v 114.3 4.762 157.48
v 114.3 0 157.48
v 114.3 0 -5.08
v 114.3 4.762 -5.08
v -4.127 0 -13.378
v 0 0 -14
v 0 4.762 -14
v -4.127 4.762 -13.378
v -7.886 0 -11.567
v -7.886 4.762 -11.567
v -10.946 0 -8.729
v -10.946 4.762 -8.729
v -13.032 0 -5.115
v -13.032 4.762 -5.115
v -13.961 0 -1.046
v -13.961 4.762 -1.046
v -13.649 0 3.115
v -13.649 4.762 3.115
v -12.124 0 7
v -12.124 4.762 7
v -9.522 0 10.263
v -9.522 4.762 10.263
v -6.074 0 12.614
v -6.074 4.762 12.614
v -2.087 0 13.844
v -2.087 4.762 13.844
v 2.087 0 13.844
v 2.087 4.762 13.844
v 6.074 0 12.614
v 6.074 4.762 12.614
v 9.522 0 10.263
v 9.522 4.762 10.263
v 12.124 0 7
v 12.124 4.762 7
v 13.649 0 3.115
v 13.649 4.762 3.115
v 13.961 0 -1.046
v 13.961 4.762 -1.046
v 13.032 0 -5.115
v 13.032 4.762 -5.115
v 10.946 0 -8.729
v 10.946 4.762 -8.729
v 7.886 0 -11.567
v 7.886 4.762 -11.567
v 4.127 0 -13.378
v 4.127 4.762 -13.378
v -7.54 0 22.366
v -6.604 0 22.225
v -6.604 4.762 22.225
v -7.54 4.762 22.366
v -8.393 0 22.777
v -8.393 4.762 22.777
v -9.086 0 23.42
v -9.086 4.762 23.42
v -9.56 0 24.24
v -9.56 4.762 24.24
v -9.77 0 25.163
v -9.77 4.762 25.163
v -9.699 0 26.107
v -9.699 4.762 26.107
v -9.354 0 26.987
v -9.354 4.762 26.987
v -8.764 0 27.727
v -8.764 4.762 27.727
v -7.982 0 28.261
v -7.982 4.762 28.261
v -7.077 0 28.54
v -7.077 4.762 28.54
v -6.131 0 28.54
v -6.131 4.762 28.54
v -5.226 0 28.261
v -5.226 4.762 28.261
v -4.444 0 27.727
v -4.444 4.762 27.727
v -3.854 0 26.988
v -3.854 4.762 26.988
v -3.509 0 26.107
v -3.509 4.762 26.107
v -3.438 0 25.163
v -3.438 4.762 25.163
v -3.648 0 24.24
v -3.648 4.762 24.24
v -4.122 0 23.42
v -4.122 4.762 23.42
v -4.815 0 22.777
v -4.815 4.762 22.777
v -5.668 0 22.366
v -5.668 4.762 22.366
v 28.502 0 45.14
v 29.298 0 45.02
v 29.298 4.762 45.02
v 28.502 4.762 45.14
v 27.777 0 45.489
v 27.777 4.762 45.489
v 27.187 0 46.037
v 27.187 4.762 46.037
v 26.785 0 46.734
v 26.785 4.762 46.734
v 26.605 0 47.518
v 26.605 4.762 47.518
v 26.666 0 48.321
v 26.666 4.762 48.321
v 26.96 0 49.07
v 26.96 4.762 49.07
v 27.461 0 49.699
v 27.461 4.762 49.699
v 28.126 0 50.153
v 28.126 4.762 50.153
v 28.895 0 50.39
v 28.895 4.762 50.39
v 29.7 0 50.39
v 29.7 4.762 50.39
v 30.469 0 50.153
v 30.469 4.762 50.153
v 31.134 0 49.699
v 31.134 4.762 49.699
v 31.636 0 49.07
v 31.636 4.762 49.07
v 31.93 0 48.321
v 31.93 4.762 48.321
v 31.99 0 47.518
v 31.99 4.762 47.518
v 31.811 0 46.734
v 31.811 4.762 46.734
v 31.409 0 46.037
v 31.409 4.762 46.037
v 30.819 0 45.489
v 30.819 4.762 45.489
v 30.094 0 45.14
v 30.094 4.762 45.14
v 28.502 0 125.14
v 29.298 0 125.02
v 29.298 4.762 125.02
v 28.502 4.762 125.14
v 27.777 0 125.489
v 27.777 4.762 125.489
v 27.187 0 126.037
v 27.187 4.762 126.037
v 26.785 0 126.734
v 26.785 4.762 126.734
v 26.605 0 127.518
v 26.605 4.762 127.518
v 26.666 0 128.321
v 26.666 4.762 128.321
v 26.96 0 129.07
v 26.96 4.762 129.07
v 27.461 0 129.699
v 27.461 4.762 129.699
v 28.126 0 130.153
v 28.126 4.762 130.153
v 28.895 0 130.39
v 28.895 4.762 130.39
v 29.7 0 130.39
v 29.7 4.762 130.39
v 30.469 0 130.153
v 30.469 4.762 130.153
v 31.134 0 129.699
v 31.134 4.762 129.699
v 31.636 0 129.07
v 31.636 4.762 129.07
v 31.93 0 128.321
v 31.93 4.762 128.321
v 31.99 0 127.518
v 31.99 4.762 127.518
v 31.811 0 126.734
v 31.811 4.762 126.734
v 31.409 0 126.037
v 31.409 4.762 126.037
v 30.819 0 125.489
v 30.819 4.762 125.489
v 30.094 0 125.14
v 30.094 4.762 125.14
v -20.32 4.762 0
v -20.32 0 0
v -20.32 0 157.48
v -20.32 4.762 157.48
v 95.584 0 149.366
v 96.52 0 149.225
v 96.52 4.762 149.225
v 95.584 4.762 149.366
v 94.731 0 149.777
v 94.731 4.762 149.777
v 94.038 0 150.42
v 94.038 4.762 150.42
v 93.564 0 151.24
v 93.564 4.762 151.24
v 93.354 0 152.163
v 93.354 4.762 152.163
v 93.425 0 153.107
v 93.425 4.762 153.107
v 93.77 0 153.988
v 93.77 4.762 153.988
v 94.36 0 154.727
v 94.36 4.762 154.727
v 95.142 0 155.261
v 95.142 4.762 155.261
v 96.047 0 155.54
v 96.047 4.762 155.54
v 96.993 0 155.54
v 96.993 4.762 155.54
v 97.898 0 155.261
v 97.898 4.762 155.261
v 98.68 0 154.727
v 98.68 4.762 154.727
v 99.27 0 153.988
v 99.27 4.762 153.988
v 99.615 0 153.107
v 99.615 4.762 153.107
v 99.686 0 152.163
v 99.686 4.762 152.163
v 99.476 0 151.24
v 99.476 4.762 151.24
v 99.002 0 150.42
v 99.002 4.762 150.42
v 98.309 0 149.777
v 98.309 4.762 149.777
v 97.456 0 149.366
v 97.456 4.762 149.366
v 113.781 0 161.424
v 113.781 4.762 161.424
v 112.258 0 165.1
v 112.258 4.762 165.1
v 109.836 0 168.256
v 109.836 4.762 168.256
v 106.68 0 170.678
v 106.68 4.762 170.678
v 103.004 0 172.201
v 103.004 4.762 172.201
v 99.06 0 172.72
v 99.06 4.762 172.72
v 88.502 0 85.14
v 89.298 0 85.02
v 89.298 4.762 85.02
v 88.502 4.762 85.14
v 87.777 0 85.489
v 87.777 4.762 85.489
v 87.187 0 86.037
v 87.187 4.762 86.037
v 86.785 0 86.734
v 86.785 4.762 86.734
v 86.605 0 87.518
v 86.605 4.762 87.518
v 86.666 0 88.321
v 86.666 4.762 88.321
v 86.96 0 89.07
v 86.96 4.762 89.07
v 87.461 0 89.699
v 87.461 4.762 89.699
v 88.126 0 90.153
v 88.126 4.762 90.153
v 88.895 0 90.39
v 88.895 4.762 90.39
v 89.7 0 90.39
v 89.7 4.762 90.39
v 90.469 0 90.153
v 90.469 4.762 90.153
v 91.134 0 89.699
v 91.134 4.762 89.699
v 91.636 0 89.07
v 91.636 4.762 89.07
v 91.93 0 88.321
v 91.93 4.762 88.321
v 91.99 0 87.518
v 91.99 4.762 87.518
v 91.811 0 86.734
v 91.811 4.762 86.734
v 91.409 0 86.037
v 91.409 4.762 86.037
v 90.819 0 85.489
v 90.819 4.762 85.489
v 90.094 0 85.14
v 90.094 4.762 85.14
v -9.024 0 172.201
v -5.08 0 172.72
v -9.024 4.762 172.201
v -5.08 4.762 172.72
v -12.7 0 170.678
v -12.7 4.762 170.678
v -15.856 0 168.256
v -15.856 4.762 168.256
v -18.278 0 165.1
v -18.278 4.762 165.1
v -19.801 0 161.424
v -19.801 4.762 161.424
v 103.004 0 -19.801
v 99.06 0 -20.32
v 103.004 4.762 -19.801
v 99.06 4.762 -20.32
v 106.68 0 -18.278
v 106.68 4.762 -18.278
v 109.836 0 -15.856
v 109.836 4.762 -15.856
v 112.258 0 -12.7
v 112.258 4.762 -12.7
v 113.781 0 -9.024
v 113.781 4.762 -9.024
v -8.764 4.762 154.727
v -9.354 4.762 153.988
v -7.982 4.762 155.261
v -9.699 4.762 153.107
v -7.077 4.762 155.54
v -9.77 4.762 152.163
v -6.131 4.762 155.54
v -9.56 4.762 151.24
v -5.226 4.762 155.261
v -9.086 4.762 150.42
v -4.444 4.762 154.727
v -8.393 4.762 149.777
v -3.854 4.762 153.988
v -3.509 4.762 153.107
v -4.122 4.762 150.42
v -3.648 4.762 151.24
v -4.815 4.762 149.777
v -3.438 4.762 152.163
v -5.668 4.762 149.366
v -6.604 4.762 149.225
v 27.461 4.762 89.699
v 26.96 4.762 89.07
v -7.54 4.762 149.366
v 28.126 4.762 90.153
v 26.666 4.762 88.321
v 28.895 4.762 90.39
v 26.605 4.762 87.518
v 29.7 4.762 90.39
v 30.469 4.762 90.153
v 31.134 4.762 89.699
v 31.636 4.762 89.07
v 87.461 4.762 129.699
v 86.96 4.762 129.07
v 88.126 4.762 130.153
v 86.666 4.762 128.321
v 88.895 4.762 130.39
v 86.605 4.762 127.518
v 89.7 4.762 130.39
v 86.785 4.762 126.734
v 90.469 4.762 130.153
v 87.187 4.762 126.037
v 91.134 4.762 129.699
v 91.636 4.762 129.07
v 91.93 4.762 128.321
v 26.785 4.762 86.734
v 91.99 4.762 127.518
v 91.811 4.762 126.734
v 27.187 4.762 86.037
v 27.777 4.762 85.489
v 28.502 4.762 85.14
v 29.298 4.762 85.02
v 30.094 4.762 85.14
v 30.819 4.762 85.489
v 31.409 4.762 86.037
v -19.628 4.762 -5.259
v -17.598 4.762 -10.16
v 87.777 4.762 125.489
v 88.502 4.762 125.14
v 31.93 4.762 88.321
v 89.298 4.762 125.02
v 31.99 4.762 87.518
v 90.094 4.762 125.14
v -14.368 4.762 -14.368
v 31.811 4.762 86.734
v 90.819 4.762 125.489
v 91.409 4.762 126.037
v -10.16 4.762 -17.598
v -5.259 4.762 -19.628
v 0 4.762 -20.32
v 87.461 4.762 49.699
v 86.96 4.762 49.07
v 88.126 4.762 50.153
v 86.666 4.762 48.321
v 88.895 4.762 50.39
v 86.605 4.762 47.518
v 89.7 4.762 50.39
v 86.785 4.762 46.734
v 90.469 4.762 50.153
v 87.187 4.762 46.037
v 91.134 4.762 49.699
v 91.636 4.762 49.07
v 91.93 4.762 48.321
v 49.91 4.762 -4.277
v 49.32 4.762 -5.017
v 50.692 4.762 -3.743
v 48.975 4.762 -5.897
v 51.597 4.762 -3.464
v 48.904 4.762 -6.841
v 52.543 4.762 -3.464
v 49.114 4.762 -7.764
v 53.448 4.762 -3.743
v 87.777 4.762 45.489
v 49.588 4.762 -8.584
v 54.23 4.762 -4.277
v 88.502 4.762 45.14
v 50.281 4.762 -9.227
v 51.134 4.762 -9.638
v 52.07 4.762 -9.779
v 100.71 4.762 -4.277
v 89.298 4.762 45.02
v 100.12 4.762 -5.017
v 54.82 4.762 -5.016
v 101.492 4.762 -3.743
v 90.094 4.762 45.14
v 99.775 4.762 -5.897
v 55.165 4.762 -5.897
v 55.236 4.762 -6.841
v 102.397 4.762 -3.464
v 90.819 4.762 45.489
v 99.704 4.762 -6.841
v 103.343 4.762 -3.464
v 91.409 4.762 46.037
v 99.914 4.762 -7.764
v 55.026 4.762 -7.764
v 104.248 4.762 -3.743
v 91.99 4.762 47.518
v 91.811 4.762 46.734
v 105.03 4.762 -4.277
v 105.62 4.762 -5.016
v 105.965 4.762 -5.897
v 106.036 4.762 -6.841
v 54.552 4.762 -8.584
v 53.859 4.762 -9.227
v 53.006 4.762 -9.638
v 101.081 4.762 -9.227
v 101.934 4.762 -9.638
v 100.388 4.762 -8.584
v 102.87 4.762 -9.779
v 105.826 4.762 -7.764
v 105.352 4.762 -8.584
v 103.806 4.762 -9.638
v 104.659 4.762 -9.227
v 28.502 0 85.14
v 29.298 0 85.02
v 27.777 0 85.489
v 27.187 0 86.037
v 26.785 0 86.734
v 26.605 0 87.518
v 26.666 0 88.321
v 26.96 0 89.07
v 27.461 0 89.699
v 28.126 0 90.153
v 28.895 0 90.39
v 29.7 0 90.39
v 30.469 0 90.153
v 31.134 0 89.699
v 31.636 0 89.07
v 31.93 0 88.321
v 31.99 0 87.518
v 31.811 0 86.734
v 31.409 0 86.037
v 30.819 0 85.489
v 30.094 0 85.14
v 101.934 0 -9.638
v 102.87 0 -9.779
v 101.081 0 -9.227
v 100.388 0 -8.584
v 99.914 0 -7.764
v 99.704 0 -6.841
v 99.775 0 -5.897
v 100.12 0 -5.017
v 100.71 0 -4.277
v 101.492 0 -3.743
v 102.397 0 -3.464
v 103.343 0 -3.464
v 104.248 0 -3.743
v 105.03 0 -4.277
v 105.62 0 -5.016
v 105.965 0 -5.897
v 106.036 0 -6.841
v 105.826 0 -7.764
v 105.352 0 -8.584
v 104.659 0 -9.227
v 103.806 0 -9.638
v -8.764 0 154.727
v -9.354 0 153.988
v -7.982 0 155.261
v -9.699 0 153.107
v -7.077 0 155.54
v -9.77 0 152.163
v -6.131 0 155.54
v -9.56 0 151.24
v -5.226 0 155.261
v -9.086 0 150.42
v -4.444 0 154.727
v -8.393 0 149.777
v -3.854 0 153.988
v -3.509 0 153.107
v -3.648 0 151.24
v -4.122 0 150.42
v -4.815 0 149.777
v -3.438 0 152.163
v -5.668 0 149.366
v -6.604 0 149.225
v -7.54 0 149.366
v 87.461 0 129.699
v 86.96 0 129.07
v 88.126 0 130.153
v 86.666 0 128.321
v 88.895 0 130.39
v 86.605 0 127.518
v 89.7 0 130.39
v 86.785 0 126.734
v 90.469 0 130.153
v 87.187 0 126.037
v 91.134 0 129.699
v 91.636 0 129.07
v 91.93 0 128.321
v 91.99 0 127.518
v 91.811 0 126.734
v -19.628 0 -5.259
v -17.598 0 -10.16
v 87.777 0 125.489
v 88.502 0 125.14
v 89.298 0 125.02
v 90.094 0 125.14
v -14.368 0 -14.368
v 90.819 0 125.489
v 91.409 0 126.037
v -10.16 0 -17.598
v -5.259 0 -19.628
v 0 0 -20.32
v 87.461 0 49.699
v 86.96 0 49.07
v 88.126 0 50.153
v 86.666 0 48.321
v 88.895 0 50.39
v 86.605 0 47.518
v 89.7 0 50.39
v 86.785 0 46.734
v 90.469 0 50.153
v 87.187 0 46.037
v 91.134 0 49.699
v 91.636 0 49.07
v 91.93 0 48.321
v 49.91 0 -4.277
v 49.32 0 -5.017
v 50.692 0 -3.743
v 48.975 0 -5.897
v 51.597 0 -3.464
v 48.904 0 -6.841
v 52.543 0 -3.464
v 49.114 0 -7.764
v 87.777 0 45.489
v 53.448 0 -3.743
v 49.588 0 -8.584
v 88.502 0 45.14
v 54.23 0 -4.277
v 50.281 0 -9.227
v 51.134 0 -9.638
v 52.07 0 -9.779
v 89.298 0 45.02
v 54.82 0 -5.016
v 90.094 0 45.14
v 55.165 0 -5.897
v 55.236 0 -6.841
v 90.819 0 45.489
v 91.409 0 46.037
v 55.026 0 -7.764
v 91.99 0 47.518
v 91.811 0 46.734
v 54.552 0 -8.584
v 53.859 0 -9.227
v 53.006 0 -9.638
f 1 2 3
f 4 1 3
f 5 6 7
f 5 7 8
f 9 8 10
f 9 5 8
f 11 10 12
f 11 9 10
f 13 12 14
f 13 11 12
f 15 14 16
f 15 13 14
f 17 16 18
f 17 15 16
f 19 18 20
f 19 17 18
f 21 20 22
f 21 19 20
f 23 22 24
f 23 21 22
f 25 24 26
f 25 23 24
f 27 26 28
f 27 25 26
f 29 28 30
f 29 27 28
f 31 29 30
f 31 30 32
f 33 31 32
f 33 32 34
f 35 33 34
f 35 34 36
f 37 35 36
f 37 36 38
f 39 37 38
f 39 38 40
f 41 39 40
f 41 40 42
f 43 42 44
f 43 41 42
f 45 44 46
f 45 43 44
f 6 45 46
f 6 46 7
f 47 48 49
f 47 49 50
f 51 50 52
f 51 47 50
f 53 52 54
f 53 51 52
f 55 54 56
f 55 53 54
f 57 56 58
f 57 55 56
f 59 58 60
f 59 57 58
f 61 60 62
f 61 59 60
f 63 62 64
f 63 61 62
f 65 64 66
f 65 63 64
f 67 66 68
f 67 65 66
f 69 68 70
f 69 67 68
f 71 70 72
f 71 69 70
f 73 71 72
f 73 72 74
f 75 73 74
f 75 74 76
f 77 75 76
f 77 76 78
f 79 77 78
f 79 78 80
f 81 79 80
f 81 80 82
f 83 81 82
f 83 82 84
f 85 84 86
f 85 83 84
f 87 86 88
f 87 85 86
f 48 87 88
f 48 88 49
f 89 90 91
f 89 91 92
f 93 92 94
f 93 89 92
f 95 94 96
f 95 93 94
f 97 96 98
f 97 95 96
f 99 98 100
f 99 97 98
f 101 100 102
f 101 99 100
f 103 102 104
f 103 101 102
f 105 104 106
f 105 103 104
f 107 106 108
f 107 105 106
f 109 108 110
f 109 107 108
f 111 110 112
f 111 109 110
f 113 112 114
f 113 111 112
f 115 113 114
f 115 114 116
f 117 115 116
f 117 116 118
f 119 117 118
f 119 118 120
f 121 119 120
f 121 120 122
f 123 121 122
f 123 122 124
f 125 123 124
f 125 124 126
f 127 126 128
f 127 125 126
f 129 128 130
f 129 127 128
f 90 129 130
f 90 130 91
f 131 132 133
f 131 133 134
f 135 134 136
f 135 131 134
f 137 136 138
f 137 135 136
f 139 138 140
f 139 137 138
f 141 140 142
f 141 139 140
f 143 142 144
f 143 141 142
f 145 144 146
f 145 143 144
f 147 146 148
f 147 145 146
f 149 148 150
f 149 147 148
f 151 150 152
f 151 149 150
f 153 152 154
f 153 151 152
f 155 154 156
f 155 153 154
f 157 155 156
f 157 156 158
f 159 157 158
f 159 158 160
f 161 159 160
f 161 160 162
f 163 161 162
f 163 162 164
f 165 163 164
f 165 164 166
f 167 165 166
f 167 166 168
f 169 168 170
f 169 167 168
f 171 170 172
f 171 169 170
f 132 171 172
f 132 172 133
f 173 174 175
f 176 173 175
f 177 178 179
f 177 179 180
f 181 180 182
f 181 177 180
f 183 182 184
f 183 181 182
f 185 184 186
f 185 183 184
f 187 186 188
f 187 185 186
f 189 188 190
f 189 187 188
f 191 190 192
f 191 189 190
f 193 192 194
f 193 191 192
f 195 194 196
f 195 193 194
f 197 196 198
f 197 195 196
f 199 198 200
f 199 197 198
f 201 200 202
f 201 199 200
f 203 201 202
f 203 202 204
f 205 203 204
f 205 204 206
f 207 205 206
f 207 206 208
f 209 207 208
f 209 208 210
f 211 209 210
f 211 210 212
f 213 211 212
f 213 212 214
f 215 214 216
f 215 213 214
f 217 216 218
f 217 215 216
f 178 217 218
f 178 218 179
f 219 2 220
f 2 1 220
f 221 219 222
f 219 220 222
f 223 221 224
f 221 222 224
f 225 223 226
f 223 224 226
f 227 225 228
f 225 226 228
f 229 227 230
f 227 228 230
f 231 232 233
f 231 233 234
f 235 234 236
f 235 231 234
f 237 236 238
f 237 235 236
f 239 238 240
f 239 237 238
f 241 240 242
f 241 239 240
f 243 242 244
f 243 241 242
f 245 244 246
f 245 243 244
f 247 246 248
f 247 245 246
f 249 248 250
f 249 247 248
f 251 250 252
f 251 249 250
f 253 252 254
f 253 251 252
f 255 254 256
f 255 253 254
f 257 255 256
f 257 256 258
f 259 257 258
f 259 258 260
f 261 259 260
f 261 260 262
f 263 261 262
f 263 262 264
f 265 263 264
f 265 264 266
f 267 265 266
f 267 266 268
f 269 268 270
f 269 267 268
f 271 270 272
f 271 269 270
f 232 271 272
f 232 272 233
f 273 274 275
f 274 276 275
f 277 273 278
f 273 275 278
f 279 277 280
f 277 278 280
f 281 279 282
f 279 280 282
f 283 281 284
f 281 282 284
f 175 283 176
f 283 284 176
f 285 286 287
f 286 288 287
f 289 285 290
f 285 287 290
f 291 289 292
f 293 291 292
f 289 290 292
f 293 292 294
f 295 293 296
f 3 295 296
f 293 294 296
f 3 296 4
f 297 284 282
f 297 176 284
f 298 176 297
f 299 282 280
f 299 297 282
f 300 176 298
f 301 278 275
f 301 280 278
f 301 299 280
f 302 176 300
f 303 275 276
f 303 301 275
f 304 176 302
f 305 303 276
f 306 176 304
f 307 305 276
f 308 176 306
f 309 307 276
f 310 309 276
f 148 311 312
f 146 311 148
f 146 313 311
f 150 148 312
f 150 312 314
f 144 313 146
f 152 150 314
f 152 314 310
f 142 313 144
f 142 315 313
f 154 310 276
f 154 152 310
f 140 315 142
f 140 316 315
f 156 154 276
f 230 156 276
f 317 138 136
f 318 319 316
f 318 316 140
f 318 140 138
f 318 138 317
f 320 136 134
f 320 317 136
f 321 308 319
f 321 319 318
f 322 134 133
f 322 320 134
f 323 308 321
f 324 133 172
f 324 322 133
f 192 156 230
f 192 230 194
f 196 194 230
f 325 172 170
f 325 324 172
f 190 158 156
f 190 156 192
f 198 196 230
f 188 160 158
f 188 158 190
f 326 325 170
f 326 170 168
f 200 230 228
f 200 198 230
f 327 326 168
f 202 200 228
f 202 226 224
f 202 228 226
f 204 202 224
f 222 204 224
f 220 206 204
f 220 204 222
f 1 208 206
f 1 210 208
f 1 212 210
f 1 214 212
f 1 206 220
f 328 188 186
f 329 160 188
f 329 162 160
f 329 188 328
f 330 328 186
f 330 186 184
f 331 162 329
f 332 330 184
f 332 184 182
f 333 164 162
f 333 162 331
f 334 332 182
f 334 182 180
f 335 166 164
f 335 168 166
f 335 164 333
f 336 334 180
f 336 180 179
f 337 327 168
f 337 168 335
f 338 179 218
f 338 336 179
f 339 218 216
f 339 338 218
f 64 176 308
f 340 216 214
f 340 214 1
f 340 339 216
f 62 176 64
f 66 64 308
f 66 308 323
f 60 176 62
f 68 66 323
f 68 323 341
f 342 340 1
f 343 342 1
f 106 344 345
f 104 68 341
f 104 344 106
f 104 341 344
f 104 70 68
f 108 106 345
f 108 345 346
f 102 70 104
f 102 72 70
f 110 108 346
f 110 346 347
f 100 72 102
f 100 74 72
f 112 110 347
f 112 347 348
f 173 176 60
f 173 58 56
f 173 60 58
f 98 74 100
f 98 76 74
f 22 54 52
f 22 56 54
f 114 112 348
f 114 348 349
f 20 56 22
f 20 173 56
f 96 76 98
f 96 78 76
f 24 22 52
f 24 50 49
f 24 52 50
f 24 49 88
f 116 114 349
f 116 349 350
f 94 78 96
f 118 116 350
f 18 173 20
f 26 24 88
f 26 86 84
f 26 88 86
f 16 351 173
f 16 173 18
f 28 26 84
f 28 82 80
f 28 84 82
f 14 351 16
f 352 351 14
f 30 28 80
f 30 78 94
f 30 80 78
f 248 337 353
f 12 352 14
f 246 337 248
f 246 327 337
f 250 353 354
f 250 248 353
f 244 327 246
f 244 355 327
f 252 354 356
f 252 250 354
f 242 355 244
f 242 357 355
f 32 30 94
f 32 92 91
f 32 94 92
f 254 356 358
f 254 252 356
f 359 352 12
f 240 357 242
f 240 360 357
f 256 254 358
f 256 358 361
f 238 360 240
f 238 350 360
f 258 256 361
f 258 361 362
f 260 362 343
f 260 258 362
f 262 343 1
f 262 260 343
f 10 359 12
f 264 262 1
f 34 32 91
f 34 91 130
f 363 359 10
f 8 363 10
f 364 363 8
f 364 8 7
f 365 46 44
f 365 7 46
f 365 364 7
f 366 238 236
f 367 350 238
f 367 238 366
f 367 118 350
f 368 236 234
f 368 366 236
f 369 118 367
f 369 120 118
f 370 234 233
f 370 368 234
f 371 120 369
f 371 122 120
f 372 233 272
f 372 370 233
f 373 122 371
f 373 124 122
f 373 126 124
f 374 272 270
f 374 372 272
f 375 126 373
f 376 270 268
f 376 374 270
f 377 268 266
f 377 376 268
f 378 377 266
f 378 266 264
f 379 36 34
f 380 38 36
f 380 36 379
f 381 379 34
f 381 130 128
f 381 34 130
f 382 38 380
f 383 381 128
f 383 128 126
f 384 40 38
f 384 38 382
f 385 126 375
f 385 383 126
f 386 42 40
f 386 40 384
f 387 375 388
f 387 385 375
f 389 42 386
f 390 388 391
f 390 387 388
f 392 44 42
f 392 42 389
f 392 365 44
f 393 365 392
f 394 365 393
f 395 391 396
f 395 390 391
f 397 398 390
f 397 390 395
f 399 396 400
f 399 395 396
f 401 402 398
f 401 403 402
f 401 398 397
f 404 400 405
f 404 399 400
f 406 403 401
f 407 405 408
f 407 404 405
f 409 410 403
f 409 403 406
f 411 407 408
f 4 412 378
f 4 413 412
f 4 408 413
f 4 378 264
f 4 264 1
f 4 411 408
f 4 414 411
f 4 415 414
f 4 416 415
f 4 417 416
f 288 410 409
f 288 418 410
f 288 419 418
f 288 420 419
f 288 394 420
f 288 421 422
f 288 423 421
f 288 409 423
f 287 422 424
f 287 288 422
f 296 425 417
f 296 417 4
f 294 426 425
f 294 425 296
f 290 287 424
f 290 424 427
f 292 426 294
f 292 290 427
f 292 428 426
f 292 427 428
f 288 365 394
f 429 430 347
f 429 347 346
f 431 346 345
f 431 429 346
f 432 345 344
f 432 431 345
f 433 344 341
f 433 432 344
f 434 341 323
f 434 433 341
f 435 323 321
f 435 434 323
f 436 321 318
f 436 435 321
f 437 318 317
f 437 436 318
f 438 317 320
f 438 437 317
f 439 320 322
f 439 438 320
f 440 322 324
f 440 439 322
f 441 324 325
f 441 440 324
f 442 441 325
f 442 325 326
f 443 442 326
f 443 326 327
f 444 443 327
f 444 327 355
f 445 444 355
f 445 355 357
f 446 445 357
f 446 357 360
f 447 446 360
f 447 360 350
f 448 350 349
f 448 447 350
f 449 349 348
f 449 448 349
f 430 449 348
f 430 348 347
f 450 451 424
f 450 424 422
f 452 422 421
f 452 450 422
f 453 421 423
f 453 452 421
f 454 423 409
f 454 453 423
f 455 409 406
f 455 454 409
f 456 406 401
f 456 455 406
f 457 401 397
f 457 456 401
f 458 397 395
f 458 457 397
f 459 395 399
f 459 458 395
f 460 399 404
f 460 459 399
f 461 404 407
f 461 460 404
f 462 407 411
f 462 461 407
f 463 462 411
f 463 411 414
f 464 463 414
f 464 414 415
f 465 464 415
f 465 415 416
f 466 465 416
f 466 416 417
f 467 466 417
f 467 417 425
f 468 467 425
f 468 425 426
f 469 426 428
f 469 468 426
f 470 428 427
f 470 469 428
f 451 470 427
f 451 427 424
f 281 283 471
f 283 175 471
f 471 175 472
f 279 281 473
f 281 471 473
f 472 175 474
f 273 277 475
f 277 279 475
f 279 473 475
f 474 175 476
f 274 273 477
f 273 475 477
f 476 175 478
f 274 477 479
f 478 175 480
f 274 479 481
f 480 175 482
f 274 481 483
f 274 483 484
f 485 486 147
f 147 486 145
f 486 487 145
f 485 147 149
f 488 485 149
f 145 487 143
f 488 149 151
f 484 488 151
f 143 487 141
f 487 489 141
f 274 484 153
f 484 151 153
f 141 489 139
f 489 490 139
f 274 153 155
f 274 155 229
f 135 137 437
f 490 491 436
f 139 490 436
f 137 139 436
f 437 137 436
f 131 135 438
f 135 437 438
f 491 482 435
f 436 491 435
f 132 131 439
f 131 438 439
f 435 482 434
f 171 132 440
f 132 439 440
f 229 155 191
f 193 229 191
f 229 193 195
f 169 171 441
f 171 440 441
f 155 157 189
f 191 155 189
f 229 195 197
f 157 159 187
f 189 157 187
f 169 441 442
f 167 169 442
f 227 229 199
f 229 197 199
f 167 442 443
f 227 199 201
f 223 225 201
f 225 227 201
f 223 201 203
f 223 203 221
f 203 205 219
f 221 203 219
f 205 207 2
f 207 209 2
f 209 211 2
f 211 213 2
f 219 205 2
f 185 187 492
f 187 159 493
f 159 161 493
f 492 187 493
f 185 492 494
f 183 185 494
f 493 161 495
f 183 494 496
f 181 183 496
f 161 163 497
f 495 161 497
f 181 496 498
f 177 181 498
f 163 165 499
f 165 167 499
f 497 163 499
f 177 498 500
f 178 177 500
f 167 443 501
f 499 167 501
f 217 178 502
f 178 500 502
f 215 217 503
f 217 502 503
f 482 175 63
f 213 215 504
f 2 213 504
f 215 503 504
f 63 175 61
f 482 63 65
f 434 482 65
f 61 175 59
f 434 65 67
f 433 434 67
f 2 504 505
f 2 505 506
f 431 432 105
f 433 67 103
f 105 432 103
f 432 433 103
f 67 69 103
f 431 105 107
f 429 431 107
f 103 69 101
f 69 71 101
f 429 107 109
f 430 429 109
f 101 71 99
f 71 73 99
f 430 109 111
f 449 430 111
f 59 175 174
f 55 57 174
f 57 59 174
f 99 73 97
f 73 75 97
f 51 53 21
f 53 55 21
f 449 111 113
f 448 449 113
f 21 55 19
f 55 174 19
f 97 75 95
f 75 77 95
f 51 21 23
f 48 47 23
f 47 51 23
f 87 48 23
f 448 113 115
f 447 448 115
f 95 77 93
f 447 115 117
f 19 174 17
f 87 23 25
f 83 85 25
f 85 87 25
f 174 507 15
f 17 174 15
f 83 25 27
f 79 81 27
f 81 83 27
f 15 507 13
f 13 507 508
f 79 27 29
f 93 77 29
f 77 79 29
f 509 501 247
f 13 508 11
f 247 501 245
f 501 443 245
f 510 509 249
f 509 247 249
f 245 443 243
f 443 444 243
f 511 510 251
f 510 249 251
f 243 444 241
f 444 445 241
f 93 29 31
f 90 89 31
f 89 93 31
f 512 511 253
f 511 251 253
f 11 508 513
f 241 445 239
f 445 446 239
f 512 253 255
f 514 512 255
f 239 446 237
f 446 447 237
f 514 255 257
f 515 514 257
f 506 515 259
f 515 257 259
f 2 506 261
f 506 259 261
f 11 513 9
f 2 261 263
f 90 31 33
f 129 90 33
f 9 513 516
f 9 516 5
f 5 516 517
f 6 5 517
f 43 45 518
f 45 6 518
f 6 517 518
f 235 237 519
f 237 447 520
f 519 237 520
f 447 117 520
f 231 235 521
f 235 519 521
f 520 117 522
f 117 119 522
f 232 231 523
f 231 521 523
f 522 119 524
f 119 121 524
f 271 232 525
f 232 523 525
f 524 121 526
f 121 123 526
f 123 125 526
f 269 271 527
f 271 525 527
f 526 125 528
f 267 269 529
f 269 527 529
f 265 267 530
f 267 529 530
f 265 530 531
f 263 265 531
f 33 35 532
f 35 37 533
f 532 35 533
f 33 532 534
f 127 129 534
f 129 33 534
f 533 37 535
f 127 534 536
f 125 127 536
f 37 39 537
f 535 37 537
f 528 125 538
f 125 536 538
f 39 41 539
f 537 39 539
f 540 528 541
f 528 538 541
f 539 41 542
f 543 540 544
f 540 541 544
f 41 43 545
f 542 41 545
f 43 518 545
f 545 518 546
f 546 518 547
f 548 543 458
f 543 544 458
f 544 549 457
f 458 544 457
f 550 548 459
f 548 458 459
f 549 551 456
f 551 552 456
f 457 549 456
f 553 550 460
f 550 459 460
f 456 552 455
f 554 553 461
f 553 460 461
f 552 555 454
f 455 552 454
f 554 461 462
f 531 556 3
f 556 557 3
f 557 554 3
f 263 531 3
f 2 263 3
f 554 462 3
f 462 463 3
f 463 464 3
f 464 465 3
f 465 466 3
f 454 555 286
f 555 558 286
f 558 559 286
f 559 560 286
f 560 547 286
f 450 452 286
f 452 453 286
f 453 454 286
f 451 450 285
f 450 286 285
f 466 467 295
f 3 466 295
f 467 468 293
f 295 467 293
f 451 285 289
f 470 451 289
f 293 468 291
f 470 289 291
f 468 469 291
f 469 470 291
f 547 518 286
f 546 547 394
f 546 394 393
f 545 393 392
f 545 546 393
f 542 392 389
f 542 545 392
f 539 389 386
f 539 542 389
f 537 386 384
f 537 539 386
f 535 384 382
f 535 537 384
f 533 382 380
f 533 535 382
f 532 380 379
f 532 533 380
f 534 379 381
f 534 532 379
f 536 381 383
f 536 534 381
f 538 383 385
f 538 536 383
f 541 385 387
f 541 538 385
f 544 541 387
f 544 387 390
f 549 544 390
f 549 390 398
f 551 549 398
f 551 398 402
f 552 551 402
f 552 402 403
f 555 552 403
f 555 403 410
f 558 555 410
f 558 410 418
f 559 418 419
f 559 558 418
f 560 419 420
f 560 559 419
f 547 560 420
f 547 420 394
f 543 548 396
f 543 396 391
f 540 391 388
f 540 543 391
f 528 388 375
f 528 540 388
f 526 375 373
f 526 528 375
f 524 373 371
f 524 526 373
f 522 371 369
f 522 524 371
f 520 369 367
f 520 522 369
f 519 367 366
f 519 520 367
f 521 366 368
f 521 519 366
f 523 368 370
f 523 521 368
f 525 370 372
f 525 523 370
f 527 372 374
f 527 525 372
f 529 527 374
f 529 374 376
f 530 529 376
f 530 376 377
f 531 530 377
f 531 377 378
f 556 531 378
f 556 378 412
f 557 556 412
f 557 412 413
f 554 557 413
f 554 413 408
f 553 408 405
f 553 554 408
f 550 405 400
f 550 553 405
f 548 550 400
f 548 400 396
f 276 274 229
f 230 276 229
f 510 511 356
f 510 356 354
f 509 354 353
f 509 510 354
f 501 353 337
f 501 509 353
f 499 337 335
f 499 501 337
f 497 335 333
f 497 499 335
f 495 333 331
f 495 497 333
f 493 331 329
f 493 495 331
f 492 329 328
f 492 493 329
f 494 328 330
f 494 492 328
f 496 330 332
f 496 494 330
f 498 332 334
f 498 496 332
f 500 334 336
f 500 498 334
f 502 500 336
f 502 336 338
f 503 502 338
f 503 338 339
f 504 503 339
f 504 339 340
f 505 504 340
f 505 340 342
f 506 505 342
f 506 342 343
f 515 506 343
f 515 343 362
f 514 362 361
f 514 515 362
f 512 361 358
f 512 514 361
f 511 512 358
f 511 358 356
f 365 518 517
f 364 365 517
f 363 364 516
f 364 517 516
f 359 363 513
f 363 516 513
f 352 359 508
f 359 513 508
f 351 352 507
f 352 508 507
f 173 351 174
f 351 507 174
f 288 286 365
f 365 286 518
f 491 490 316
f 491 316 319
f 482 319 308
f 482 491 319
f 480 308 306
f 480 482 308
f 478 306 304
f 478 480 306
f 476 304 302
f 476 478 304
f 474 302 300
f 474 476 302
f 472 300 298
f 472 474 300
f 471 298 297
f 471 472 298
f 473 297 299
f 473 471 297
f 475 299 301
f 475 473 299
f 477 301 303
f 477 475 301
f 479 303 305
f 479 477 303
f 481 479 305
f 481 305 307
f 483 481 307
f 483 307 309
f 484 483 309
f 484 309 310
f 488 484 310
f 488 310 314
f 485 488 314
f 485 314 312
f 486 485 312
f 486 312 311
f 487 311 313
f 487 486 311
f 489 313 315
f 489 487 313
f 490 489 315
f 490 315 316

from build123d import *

# Parameters (mm, degrees)
SKETCH1_R           = 3.175
SKETCH1_R_2         = 2.7
SKETCH1_R_3         = 14
BOSS_EXTRUDE1_DEPTH = 4.7625
FILLET1_R           = 15.24


with BuildPart() as part:
    # Sketch1 → Boss-Extrude1 (new body)
    with BuildSketch(Plane(origin=(0, 0, 0), x_dir=(1, 0, 0), z_dir=(0, 1, 0))):
        with BuildLine():
            Line((114.3, 20.32), (0, 20.32))
            ThreePointArc((0, 20.32), (-14.368409794, 14.368409794), (-20.32, 0))
            Line((-20.32, 0), (-20.32, -172.72))
            Line((-20.32, -172.72), (114.3, -172.72))
            Line((114.3, -172.72), (114.3, 20.32))
        make_face()
        with Locations(Location((-6.604, -152.4, 0), (0, 0, 90))):
            Circle(SKETCH1_R, mode=Mode.SUBTRACT)
        with Locations(Location((29.297861909, -127.72, 0), (0, 0, 90))):
            Circle(SKETCH1_R_2, mode=Mode.SUBTRACT)
        with Locations(Location((29.297861909, -87.72, 0), (0, 0, 90))):
            Circle(SKETCH1_R_2, mode=Mode.SUBTRACT)
        with Locations(Location((96.52, -152.4, 0), (0, 0, 90))):
            Circle(SKETCH1_R, mode=Mode.SUBTRACT)
        with Locations(Location((89.297861909, -127.72, 0), (0, 0, 90))):
            Circle(SKETCH1_R_2, mode=Mode.SUBTRACT)
        with Locations(Location((89.297861909, -87.72, 0), (0, 0, 90))):
            Circle(SKETCH1_R_2, mode=Mode.SUBTRACT)
        with Locations(Location((29.297861909, -47.72, 0), (0, 0, 90))):
            Circle(SKETCH1_R_2, mode=Mode.SUBTRACT)
        with Locations(Location((-6.604, -25.4, 0), (0, 0, 90))):
            Circle(SKETCH1_R, mode=Mode.SUBTRACT)
        with Locations(Location((89.297861909, -47.72, 0), (0, 0, 90))):
            Circle(SKETCH1_R_2, mode=Mode.SUBTRACT)
        with Locations(Location((52.07, 6.604, 0), (0, 0, 90))):
            Circle(SKETCH1_R, mode=Mode.SUBTRACT)
        with Locations(Location((102.87, 6.604, 0), (0, 0, 90))):
            Circle(SKETCH1_R, mode=Mode.SUBTRACT)
        with Locations(Location((0, 0, 0), (0, 0, 90))):
            Circle(SKETCH1_R_3, mode=Mode.SUBTRACT)
    extrude(amount=BOSS_EXTRUDE1_DEPTH)

    # Fillet1
    fillet1_edges = [part.edges().sort_by_distance(p)[0] for p in [
        (114.3, 2.38125, -20.32),
        (114.3, 2.38125, 172.72),
        (-20.32, 2.38125, 172.72),
    ]]
    fillet(fillet1_edges, radius=FILLET1_R)


solid = part.part
